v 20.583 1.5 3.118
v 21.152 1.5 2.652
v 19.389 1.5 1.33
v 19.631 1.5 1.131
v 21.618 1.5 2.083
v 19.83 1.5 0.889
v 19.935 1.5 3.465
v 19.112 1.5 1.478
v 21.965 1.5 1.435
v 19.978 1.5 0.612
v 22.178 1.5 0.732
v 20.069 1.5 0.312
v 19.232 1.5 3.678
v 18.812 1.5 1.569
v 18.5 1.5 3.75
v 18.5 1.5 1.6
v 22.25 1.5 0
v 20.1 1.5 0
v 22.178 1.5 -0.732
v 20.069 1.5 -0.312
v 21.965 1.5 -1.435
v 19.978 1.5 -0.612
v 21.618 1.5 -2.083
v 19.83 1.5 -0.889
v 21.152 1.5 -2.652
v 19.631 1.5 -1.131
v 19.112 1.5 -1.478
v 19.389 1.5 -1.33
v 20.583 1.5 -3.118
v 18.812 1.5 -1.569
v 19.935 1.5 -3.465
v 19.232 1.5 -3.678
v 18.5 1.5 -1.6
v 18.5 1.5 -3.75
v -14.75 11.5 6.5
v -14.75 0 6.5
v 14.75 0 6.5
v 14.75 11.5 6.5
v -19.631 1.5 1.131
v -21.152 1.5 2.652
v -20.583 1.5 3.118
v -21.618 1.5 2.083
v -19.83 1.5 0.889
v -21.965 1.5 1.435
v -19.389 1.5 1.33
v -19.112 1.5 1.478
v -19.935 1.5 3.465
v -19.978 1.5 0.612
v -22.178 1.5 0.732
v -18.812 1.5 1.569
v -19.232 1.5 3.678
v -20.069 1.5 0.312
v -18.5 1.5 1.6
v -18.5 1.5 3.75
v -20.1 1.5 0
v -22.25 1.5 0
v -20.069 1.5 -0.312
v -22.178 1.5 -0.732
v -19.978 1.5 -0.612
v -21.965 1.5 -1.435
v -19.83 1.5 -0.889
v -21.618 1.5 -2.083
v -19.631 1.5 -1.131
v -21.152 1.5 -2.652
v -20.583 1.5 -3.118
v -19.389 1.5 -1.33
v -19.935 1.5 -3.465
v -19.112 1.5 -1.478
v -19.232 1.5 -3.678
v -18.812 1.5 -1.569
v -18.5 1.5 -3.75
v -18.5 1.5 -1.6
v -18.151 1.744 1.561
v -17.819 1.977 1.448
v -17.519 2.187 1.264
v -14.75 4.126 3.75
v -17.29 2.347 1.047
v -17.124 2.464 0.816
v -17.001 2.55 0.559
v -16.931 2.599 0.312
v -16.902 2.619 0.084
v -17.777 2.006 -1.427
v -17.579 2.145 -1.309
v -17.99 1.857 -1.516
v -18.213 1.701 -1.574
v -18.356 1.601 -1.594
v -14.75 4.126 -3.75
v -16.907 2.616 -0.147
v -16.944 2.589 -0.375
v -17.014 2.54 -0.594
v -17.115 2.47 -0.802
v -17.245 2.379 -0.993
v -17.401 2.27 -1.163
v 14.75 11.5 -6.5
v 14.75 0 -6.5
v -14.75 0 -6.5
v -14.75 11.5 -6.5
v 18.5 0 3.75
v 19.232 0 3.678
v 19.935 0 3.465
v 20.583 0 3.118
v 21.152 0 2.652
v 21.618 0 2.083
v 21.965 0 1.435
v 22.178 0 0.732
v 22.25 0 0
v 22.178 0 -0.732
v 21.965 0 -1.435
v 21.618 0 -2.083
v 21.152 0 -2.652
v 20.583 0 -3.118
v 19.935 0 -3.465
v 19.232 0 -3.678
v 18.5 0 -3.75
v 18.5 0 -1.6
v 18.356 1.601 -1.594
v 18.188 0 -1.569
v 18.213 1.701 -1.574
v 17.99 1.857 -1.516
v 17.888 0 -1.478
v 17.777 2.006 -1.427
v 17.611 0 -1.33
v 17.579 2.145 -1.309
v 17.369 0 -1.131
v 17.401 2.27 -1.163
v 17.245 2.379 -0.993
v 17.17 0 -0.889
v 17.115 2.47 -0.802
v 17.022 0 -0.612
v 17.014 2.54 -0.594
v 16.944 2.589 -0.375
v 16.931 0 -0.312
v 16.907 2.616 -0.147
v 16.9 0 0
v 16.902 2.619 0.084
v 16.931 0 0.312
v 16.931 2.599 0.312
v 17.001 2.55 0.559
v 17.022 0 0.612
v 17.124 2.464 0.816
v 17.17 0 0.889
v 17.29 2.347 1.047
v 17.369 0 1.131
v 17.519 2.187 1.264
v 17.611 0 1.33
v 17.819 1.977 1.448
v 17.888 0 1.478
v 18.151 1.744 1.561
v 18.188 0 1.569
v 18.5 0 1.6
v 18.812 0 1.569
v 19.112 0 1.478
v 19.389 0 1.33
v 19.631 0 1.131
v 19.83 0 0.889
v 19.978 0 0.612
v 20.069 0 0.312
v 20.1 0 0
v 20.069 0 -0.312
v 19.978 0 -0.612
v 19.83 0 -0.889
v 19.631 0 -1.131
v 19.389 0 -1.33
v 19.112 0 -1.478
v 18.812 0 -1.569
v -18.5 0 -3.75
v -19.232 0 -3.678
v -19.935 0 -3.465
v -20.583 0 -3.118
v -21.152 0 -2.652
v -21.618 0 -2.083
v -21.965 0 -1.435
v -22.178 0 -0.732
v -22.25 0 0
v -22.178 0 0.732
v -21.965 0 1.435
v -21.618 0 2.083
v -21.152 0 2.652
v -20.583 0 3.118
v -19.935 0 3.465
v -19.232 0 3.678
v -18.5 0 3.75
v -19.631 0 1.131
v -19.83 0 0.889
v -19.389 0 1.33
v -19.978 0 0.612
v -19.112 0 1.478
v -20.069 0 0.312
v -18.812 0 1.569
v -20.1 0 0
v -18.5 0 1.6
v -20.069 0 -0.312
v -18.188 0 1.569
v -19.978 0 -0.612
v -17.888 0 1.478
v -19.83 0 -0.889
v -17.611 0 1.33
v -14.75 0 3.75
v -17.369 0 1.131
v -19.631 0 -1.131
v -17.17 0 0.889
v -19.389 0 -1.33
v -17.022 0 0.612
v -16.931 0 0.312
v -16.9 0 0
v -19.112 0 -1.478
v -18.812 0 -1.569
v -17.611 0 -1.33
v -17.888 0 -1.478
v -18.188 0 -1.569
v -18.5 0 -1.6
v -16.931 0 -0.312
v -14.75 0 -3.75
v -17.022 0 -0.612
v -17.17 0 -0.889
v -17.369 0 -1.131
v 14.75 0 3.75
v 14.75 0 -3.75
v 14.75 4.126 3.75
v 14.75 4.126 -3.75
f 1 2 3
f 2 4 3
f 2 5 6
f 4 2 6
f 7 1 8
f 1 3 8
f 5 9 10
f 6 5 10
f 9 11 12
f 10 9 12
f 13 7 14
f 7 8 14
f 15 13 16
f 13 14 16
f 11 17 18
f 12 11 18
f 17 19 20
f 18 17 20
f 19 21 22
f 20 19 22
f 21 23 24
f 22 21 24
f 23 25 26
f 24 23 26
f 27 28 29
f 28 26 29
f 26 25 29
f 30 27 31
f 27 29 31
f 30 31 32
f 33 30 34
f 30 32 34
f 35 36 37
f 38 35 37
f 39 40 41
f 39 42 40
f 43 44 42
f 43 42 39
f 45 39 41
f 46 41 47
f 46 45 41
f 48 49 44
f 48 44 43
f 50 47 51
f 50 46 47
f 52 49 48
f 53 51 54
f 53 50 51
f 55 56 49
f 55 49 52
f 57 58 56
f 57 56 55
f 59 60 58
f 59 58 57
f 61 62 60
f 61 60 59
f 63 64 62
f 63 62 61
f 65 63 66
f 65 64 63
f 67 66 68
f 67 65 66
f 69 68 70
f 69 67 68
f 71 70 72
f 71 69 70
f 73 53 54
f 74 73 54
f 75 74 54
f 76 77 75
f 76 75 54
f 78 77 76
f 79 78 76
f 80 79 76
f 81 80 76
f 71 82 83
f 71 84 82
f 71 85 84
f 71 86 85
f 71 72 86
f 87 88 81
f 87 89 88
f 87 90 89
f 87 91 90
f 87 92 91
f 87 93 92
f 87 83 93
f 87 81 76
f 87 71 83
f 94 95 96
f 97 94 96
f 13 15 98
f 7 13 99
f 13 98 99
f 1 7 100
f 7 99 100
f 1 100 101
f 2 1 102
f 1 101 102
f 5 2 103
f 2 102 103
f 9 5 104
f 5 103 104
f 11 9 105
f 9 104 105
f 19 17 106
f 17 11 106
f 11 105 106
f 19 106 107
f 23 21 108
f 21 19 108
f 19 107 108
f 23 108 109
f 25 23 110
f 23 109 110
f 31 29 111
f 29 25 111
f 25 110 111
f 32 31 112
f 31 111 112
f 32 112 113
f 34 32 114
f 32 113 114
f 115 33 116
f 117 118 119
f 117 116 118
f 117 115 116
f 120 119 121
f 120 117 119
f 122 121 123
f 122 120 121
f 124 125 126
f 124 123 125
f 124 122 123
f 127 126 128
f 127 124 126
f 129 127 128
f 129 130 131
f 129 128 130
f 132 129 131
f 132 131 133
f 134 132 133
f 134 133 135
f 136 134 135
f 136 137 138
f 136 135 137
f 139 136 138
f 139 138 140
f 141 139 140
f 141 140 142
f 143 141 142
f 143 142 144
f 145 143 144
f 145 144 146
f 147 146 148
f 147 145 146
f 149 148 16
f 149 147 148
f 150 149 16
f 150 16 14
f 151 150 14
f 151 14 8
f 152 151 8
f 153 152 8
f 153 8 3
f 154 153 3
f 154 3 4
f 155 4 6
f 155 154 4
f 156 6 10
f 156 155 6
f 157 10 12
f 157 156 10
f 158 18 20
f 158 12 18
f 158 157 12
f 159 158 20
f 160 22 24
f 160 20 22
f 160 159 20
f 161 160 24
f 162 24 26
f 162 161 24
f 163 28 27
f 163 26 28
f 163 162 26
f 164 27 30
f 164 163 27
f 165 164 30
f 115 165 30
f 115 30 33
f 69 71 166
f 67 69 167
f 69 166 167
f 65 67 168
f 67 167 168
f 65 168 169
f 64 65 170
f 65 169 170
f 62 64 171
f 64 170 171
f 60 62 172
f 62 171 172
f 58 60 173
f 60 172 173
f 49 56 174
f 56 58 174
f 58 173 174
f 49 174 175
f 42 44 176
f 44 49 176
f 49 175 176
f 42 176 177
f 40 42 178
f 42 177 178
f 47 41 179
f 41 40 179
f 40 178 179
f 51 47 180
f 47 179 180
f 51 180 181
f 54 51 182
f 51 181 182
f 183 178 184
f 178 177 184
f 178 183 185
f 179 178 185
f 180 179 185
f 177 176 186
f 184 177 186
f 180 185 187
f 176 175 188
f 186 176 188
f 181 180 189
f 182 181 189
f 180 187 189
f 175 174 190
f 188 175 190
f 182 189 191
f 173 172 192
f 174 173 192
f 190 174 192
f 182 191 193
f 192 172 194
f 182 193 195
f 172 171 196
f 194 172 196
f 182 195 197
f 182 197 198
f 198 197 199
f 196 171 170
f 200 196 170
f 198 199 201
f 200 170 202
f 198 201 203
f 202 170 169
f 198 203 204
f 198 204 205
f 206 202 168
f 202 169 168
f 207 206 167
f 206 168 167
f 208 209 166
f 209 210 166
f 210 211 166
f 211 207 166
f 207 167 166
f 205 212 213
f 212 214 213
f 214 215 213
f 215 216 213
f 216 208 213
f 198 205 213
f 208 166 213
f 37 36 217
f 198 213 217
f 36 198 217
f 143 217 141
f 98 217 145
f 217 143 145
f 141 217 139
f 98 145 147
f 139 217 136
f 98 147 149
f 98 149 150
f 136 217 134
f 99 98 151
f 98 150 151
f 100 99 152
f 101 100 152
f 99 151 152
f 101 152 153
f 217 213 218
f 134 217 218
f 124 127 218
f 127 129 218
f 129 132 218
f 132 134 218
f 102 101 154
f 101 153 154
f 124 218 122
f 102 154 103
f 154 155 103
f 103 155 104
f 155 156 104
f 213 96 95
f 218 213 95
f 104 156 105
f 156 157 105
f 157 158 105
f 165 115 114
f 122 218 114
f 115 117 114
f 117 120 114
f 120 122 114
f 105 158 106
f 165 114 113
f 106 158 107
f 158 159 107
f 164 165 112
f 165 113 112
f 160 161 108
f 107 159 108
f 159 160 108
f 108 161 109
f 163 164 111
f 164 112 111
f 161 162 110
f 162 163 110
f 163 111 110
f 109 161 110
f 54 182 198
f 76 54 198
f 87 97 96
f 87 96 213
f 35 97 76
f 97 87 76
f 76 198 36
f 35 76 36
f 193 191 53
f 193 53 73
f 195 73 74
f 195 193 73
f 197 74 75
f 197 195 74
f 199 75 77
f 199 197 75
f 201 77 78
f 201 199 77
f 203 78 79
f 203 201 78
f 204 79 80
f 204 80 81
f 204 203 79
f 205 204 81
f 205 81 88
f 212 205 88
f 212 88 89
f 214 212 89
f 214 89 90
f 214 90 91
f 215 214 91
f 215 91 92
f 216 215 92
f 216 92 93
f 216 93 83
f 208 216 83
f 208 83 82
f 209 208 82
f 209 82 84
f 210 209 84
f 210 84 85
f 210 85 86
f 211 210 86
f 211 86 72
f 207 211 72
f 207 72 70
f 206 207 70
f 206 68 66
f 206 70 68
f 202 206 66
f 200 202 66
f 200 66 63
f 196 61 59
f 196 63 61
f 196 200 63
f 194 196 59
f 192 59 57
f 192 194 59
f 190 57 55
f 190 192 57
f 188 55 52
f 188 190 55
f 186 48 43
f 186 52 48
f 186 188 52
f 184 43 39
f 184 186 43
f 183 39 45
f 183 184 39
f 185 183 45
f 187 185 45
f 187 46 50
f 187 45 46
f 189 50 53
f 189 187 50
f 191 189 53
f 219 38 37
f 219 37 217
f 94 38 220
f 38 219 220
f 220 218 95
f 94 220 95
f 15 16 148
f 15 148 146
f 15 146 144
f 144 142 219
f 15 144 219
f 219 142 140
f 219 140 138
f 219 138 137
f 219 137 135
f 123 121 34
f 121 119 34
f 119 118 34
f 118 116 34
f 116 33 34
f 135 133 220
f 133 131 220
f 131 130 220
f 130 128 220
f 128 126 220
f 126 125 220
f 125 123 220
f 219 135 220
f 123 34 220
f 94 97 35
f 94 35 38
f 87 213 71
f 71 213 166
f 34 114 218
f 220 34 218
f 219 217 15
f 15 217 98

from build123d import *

# Parameters (mm, degrees)
CROQUIS1_R                 = 1.6
SALIENTE_EXTRUIR2_DEPTH    = 11.5
CORTAR_EXTRUIR1_DEPTH      = 26.875905781
CORTAR_EXTRUIR1_DEPTH_BACK = 26.875905781


with BuildPart() as part:
    # Croquis1 → Saliente-Extruir2 (new body)
    with BuildSketch(Plane(origin=(0, 0, 0), x_dir=(1, 0, 0), z_dir=(0, 1, 0))):
        with BuildLine():
            Line((-14.75, -6.5), (14.75, -6.5))
            Line((14.75, -6.5), (14.75, -3.75))
            Line((14.75, -3.75), (18.5, -3.75))
            ThreePointArc((18.5, -3.75), (22.25, 0), (18.5, 3.75))
            Line((18.5, 3.75), (14.75, 3.75))
            Line((14.75, 3.75), (14.75, 6.5))
            Line((14.75, 6.5), (-14.75, 6.5))
            Line((-14.75, 6.5), (-14.75, 3.75))
            Line((-14.75, 3.75), (-18.5, 3.75))
            ThreePointArc((-18.5, 3.75), (-22.25, 0), (-18.5, -3.75))
            Line((-18.5, -3.75), (-14.75, -3.75))
            Line((-14.75, -3.75), (-14.75, -6.5))
        make_face()
        with Locations(Location((-18.5, 0, 0), (0, 0, 270))):
            Circle(CROQUIS1_R, mode=Mode.SUBTRACT)
        with Locations(Location((18.5, 0, 0), (0, 0, 90))):
            Circle(CROQUIS1_R, mode=Mode.SUBTRACT)
    extrude(amount=SALIENTE_EXTRUIR2_DEPTH)

    # Croquis2 → Cortar-Extruir1 (cut, two sides: drawn at the far end of the back side and taken through both)
    with BuildSketch(Plane.XY.offset(-CORTAR_EXTRUIR1_DEPTH_BACK)):
        Polygon((22.25, 11.5), (22.25, 1.5), (18.5, 1.5), (14.75, 4.125778268), (14.75, 11.5), align=None)
        Polygon((-22.25, 11.5), (-22.25, 1.5), (-18.5, 1.5), (-14.75, 4.125778268), (-14.75, 11.5), align=None)
    extrude(amount=CORTAR_EXTRUIR1_DEPTH + CORTAR_EXTRUIR1_DEPTH_BACK, mode=Mode.SUBTRACT)


solid = part.part
